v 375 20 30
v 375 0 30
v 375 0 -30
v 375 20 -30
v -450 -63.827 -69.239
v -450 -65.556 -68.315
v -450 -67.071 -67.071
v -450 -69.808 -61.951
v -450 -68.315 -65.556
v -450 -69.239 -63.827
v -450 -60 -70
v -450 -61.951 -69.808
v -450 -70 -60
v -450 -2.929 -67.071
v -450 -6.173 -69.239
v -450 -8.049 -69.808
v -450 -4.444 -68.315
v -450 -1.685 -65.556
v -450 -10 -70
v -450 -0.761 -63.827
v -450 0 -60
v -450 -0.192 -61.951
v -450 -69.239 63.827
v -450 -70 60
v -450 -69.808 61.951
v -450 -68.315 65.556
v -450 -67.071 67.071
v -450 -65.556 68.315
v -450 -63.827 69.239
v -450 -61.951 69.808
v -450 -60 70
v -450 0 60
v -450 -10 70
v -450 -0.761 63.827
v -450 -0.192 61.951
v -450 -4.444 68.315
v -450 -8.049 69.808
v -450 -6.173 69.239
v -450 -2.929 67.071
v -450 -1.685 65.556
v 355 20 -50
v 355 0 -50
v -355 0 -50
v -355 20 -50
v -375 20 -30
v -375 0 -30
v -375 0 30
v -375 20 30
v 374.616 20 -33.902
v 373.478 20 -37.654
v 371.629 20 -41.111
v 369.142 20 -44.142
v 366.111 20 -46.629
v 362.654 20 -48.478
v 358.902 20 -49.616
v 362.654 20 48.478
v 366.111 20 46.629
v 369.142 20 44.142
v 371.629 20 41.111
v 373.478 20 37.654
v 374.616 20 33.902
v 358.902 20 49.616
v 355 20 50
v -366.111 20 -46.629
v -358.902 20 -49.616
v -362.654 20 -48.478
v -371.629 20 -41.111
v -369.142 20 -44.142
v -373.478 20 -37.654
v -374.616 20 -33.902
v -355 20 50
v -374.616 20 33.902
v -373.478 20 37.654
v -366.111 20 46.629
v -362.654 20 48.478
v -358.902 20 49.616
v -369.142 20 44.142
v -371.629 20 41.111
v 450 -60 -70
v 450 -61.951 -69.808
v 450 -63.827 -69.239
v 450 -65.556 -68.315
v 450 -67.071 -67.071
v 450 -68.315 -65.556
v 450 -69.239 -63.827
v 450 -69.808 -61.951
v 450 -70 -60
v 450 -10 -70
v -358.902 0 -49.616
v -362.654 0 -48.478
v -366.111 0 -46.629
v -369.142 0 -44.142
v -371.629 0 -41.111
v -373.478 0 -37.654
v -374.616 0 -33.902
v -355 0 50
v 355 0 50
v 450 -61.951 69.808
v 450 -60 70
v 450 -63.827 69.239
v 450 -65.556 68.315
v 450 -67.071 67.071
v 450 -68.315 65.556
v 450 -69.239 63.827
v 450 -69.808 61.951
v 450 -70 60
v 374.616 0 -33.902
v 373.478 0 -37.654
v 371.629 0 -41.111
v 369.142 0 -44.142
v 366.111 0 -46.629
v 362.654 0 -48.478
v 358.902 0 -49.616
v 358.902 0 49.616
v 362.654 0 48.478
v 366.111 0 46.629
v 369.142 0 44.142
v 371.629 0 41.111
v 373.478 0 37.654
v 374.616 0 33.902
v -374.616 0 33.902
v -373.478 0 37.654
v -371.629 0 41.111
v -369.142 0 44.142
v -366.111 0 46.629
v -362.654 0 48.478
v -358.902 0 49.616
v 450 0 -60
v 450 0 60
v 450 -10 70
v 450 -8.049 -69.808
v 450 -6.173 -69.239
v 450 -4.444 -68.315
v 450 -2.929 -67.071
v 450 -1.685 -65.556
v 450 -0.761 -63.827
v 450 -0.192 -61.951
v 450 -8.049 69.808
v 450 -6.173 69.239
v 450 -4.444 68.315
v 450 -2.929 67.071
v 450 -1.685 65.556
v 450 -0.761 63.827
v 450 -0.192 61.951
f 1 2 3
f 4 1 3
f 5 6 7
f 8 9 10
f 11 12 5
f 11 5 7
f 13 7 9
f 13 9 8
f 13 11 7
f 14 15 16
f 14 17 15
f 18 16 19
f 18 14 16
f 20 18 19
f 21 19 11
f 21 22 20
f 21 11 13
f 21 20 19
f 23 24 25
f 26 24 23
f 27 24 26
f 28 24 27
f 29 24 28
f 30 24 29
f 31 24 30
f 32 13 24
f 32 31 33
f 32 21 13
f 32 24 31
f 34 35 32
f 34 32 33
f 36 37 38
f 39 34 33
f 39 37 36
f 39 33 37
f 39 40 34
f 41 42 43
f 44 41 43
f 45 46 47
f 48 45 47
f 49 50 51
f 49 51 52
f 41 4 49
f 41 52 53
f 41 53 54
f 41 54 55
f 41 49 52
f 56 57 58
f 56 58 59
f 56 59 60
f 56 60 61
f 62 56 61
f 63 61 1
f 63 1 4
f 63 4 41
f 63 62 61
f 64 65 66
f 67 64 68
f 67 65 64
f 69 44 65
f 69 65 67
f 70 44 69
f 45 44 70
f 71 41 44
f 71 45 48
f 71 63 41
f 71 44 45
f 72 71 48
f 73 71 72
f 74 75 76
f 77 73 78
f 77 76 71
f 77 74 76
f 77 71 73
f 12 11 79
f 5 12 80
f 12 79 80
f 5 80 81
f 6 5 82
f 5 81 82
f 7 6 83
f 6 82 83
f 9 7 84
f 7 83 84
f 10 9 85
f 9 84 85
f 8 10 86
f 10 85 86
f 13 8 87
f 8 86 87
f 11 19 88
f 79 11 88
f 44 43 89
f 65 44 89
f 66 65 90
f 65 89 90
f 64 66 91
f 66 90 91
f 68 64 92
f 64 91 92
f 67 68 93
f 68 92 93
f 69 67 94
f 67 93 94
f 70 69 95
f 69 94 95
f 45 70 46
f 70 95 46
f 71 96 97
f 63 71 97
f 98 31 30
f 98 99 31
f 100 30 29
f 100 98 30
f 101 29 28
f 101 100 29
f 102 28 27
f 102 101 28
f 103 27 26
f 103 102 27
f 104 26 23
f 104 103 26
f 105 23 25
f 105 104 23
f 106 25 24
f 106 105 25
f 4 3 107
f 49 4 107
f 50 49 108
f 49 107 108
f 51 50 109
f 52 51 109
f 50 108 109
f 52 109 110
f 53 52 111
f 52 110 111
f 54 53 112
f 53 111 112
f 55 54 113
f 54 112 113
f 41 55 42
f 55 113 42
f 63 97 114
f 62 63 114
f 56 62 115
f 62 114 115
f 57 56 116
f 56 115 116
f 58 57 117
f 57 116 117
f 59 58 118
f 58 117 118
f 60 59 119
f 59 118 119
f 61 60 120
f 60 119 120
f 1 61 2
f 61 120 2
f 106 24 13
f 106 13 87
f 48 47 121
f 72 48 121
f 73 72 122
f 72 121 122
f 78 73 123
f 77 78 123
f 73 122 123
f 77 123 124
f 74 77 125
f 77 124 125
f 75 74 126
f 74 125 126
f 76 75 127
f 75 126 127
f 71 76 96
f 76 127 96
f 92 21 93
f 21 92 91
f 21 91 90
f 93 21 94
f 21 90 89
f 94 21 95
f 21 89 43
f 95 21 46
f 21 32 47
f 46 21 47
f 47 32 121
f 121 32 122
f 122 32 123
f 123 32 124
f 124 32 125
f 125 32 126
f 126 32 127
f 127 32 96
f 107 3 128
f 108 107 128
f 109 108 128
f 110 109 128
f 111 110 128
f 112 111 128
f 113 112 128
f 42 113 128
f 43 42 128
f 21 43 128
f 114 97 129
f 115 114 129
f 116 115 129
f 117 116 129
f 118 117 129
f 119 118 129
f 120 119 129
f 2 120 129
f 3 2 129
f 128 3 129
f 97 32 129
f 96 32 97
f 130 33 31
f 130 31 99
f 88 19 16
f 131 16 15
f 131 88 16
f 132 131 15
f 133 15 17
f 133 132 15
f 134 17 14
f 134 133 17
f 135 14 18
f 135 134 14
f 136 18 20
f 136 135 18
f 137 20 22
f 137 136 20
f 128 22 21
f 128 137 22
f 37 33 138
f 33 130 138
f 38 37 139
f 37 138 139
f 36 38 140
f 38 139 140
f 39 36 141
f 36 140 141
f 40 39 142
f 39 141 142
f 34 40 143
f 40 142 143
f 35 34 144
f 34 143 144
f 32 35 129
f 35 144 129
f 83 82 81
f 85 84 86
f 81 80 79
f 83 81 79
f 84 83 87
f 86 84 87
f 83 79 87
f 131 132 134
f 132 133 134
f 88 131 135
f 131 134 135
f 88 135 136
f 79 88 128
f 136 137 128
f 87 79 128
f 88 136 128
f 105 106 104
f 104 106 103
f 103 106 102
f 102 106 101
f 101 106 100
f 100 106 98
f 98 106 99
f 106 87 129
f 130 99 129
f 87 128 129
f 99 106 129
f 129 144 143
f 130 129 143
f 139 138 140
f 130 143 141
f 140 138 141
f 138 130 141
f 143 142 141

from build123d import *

# Parameters (mm, degrees)
F0_W     = 900
F0_H     = 140
F1_DEPTH = 70
F2_R     = 10
F4_DEPTH = 20


with BuildPart() as f1:
    # F0 (on Front) → F1 (new body)
    with BuildSketch(Plane.XZ):
        Rectangle(F0_W, F0_H)
    extrude(amount=F1_DEPTH)

    # F2
    f2_edges = [f1.edges().sort_by_distance(p)[0] for p in [
        (0, -70, 70),
        (0, 0, 70),
        (0, -70, -70),
        (0, 0, -70),
    ]]
    fillet(f2_edges, radius=F2_R)

    # F3 (on face) → F4 (join)
    with BuildSketch(Plane(origin=(0, 0, 0), x_dir=(-1, 0, 0), z_dir=(0, 1, 0))):
        with BuildLine():
            ThreePointArc((375, 30), (369.142136, 44.142136), (355, 50))
            Line((355, 50), (-355, 50))
            ThreePointArc((-355, 50), (-369.142136, 44.142136), (-375, 30))
            Line((-375, 30), (-375, -30))
            ThreePointArc((-375, -30), (-369.142136, -44.142136), (-355, -50))
            Line((-355, -50), (355, -50))
            ThreePointArc((355, -50), (369.142136, -44.142136), (375, -30))
            Line((375, -30), (375, 30))
        make_face()
    extrude(amount=F4_DEPTH)


solid = f1.part
